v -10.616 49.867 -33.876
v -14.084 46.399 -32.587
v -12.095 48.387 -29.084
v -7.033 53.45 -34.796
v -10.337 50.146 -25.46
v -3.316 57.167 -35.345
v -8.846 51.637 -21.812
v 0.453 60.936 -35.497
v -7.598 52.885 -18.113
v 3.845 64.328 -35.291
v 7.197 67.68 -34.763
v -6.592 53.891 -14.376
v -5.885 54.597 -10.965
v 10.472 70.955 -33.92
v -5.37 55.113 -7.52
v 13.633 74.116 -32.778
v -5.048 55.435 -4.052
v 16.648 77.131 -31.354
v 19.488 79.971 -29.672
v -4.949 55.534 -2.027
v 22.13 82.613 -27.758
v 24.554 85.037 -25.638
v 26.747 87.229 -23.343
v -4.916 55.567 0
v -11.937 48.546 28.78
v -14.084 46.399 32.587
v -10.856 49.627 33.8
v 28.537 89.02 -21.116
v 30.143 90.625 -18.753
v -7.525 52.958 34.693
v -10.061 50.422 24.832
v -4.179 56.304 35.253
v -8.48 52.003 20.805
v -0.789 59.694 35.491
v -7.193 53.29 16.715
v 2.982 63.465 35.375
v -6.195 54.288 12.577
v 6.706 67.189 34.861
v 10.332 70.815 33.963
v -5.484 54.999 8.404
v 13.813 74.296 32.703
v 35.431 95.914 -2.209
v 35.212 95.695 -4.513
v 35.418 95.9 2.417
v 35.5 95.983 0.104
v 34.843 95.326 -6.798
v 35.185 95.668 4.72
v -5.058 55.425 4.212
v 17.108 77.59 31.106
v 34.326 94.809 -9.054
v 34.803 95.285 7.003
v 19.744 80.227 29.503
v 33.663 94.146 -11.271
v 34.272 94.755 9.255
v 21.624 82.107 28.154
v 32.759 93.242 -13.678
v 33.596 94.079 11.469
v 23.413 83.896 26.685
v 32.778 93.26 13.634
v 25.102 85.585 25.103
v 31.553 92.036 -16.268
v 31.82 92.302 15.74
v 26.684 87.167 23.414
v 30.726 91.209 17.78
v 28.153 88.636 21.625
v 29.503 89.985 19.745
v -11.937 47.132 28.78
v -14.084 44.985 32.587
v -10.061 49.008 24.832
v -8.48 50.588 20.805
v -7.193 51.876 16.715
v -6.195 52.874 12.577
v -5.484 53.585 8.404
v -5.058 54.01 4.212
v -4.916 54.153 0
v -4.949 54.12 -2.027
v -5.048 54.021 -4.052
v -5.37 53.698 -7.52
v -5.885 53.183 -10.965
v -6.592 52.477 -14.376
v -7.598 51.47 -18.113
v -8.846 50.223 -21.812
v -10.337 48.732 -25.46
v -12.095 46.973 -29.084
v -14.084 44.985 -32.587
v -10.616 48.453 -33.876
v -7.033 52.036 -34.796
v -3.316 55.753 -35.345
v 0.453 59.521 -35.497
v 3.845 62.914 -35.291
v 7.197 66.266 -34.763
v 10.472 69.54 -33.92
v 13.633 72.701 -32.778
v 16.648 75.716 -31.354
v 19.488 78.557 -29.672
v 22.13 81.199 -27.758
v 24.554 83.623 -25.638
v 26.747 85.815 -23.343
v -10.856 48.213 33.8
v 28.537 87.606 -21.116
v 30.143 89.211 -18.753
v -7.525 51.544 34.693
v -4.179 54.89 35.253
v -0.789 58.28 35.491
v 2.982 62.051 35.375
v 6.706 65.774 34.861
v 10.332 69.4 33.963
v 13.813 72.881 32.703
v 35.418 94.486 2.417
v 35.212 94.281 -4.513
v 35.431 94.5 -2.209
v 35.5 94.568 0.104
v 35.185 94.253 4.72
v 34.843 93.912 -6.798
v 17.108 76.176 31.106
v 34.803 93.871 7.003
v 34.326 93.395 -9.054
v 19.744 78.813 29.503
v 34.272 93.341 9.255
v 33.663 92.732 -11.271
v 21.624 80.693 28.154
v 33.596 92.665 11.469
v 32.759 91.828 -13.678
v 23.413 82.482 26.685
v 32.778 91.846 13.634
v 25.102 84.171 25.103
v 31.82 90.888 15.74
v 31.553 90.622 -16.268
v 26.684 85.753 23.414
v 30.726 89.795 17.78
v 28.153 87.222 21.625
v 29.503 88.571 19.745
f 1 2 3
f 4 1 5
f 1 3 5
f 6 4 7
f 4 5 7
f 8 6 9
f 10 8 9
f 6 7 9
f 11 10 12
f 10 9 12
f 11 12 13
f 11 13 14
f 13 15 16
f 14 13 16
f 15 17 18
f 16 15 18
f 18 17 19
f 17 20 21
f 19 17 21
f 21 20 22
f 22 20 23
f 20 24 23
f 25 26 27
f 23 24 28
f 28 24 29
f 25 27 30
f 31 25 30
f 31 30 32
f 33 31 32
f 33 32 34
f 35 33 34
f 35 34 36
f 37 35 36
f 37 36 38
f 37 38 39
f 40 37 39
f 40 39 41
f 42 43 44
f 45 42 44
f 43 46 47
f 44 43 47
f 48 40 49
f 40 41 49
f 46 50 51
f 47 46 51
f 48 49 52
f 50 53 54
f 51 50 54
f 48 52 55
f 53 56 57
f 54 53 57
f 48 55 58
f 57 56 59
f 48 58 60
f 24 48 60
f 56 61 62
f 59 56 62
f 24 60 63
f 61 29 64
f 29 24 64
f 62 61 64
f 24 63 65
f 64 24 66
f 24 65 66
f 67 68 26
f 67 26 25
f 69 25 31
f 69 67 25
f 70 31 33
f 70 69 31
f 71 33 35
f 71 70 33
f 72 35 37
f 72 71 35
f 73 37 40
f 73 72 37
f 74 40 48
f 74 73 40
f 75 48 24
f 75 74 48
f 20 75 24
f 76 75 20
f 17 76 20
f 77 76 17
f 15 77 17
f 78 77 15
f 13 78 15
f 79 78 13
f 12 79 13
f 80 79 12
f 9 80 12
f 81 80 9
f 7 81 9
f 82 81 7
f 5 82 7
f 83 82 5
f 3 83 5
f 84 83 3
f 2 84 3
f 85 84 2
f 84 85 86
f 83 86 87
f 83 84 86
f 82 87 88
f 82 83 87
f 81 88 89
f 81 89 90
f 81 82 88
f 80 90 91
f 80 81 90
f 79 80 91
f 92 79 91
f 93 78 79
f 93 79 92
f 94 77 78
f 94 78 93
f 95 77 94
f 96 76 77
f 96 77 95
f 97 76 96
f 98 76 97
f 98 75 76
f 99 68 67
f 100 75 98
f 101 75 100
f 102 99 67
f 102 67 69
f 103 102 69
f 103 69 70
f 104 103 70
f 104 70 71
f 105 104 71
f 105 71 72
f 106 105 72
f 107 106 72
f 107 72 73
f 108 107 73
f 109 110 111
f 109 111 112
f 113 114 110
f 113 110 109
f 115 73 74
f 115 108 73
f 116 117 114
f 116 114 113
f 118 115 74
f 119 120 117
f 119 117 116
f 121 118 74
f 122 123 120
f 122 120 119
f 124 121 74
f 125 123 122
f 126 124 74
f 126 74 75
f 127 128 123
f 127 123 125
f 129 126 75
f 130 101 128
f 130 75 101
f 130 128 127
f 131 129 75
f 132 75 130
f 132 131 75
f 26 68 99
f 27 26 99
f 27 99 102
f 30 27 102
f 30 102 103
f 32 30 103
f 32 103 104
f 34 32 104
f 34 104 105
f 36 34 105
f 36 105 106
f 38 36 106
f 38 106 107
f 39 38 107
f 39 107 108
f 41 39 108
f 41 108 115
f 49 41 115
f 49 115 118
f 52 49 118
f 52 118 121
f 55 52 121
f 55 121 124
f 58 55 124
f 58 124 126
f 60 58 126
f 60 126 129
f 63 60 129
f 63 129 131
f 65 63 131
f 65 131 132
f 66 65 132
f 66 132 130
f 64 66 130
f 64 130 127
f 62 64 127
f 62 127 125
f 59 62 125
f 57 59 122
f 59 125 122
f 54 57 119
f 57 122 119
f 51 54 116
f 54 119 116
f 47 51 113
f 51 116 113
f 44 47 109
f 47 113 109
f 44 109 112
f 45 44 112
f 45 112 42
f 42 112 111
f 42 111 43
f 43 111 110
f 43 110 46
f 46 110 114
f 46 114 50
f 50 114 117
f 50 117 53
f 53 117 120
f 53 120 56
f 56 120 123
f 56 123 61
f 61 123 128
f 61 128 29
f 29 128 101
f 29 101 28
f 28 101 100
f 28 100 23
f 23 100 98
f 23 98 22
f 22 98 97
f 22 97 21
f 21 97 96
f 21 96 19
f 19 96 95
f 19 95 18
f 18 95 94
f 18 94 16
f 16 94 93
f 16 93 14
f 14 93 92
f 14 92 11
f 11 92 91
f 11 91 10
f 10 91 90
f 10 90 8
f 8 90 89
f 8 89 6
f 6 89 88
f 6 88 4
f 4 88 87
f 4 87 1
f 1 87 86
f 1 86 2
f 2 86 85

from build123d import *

# Parameters (mm, degrees)
SKETCH4_W               = 232.52141371
SKETCH4_H               = 186.000175814
BOSS_EXTRUDE1_DEPTH     = 1
SKETCH1_OUTSIDE_W       = 226.832
SKETCH1_OUTSIDE_H       = 247.708
SKETCH1_OUTSIDE_R       = 35.5
CUT_EXTRUDE2_DEPTH      = 185.225637078
CUT_EXTRUDE3_DEPTH      = 109.319901238
CUT_EXTRUDE3_DEPTH_BACK = 109.319901238
SKETCH5_R               = 62.5


with BuildPart() as part:
    # Sketch4 → Boss-Extrude1 (new body)
    with BuildSketch(Plane(origin=(-30.241408096, 30.241408096, 0), x_dir=(0.7071067811865512, 0.7071067811865439, 0), z_dir=(0.7071067811865439, -0.7071067811865512, 0))):
        Rectangle(SKETCH4_W, SKETCH4_H)
    extrude(amount=BOSS_EXTRUDE1_DEPTH)

    # Sketch1 outside → Cut-Extrude2 (cut, through all)
    with BuildSketch(Plane(origin=(0, 0, 0), x_dir=(1, 0, 0), z_dir=(0, 1, 0))):
        with Locations((-29.888, 0)):
            Rectangle(SKETCH1_OUTSIDE_W, SKETCH1_OUTSIDE_H)
        with Locations(Location((0, 0, 0), (0, 0, 180))):
            Circle(SKETCH1_OUTSIDE_R, mode=Mode.SUBTRACT)
    extrude(amount=CUT_EXTRUDE2_DEPTH, mode=Mode.SUBTRACT)


with BuildPart() as body_2:
    # of the pieces the cut leaves, the one that is kept (cut_extrude2_keep)
    add(part.part.solids().sort_by_distance((-35.5, 24.982816193, 0))[0])

    # Sketch5 → Cut-Extrude3 (cut, two sides: drawn at the far end of the back side and taken through both)
    with BuildSketch(Plane(origin=(0, 0, 0), x_dir=(1, 0, 0), z_dir=(0, 1, 0)).offset(-CUT_EXTRUDE3_DEPTH_BACK)):
        with Locations((-67.416033427, 0)):
            Circle(SKETCH5_R)
    extrude(amount=CUT_EXTRUDE3_DEPTH + CUT_EXTRUDE3_DEPTH_BACK, mode=Mode.SUBTRACT)


solid = body_2.part
